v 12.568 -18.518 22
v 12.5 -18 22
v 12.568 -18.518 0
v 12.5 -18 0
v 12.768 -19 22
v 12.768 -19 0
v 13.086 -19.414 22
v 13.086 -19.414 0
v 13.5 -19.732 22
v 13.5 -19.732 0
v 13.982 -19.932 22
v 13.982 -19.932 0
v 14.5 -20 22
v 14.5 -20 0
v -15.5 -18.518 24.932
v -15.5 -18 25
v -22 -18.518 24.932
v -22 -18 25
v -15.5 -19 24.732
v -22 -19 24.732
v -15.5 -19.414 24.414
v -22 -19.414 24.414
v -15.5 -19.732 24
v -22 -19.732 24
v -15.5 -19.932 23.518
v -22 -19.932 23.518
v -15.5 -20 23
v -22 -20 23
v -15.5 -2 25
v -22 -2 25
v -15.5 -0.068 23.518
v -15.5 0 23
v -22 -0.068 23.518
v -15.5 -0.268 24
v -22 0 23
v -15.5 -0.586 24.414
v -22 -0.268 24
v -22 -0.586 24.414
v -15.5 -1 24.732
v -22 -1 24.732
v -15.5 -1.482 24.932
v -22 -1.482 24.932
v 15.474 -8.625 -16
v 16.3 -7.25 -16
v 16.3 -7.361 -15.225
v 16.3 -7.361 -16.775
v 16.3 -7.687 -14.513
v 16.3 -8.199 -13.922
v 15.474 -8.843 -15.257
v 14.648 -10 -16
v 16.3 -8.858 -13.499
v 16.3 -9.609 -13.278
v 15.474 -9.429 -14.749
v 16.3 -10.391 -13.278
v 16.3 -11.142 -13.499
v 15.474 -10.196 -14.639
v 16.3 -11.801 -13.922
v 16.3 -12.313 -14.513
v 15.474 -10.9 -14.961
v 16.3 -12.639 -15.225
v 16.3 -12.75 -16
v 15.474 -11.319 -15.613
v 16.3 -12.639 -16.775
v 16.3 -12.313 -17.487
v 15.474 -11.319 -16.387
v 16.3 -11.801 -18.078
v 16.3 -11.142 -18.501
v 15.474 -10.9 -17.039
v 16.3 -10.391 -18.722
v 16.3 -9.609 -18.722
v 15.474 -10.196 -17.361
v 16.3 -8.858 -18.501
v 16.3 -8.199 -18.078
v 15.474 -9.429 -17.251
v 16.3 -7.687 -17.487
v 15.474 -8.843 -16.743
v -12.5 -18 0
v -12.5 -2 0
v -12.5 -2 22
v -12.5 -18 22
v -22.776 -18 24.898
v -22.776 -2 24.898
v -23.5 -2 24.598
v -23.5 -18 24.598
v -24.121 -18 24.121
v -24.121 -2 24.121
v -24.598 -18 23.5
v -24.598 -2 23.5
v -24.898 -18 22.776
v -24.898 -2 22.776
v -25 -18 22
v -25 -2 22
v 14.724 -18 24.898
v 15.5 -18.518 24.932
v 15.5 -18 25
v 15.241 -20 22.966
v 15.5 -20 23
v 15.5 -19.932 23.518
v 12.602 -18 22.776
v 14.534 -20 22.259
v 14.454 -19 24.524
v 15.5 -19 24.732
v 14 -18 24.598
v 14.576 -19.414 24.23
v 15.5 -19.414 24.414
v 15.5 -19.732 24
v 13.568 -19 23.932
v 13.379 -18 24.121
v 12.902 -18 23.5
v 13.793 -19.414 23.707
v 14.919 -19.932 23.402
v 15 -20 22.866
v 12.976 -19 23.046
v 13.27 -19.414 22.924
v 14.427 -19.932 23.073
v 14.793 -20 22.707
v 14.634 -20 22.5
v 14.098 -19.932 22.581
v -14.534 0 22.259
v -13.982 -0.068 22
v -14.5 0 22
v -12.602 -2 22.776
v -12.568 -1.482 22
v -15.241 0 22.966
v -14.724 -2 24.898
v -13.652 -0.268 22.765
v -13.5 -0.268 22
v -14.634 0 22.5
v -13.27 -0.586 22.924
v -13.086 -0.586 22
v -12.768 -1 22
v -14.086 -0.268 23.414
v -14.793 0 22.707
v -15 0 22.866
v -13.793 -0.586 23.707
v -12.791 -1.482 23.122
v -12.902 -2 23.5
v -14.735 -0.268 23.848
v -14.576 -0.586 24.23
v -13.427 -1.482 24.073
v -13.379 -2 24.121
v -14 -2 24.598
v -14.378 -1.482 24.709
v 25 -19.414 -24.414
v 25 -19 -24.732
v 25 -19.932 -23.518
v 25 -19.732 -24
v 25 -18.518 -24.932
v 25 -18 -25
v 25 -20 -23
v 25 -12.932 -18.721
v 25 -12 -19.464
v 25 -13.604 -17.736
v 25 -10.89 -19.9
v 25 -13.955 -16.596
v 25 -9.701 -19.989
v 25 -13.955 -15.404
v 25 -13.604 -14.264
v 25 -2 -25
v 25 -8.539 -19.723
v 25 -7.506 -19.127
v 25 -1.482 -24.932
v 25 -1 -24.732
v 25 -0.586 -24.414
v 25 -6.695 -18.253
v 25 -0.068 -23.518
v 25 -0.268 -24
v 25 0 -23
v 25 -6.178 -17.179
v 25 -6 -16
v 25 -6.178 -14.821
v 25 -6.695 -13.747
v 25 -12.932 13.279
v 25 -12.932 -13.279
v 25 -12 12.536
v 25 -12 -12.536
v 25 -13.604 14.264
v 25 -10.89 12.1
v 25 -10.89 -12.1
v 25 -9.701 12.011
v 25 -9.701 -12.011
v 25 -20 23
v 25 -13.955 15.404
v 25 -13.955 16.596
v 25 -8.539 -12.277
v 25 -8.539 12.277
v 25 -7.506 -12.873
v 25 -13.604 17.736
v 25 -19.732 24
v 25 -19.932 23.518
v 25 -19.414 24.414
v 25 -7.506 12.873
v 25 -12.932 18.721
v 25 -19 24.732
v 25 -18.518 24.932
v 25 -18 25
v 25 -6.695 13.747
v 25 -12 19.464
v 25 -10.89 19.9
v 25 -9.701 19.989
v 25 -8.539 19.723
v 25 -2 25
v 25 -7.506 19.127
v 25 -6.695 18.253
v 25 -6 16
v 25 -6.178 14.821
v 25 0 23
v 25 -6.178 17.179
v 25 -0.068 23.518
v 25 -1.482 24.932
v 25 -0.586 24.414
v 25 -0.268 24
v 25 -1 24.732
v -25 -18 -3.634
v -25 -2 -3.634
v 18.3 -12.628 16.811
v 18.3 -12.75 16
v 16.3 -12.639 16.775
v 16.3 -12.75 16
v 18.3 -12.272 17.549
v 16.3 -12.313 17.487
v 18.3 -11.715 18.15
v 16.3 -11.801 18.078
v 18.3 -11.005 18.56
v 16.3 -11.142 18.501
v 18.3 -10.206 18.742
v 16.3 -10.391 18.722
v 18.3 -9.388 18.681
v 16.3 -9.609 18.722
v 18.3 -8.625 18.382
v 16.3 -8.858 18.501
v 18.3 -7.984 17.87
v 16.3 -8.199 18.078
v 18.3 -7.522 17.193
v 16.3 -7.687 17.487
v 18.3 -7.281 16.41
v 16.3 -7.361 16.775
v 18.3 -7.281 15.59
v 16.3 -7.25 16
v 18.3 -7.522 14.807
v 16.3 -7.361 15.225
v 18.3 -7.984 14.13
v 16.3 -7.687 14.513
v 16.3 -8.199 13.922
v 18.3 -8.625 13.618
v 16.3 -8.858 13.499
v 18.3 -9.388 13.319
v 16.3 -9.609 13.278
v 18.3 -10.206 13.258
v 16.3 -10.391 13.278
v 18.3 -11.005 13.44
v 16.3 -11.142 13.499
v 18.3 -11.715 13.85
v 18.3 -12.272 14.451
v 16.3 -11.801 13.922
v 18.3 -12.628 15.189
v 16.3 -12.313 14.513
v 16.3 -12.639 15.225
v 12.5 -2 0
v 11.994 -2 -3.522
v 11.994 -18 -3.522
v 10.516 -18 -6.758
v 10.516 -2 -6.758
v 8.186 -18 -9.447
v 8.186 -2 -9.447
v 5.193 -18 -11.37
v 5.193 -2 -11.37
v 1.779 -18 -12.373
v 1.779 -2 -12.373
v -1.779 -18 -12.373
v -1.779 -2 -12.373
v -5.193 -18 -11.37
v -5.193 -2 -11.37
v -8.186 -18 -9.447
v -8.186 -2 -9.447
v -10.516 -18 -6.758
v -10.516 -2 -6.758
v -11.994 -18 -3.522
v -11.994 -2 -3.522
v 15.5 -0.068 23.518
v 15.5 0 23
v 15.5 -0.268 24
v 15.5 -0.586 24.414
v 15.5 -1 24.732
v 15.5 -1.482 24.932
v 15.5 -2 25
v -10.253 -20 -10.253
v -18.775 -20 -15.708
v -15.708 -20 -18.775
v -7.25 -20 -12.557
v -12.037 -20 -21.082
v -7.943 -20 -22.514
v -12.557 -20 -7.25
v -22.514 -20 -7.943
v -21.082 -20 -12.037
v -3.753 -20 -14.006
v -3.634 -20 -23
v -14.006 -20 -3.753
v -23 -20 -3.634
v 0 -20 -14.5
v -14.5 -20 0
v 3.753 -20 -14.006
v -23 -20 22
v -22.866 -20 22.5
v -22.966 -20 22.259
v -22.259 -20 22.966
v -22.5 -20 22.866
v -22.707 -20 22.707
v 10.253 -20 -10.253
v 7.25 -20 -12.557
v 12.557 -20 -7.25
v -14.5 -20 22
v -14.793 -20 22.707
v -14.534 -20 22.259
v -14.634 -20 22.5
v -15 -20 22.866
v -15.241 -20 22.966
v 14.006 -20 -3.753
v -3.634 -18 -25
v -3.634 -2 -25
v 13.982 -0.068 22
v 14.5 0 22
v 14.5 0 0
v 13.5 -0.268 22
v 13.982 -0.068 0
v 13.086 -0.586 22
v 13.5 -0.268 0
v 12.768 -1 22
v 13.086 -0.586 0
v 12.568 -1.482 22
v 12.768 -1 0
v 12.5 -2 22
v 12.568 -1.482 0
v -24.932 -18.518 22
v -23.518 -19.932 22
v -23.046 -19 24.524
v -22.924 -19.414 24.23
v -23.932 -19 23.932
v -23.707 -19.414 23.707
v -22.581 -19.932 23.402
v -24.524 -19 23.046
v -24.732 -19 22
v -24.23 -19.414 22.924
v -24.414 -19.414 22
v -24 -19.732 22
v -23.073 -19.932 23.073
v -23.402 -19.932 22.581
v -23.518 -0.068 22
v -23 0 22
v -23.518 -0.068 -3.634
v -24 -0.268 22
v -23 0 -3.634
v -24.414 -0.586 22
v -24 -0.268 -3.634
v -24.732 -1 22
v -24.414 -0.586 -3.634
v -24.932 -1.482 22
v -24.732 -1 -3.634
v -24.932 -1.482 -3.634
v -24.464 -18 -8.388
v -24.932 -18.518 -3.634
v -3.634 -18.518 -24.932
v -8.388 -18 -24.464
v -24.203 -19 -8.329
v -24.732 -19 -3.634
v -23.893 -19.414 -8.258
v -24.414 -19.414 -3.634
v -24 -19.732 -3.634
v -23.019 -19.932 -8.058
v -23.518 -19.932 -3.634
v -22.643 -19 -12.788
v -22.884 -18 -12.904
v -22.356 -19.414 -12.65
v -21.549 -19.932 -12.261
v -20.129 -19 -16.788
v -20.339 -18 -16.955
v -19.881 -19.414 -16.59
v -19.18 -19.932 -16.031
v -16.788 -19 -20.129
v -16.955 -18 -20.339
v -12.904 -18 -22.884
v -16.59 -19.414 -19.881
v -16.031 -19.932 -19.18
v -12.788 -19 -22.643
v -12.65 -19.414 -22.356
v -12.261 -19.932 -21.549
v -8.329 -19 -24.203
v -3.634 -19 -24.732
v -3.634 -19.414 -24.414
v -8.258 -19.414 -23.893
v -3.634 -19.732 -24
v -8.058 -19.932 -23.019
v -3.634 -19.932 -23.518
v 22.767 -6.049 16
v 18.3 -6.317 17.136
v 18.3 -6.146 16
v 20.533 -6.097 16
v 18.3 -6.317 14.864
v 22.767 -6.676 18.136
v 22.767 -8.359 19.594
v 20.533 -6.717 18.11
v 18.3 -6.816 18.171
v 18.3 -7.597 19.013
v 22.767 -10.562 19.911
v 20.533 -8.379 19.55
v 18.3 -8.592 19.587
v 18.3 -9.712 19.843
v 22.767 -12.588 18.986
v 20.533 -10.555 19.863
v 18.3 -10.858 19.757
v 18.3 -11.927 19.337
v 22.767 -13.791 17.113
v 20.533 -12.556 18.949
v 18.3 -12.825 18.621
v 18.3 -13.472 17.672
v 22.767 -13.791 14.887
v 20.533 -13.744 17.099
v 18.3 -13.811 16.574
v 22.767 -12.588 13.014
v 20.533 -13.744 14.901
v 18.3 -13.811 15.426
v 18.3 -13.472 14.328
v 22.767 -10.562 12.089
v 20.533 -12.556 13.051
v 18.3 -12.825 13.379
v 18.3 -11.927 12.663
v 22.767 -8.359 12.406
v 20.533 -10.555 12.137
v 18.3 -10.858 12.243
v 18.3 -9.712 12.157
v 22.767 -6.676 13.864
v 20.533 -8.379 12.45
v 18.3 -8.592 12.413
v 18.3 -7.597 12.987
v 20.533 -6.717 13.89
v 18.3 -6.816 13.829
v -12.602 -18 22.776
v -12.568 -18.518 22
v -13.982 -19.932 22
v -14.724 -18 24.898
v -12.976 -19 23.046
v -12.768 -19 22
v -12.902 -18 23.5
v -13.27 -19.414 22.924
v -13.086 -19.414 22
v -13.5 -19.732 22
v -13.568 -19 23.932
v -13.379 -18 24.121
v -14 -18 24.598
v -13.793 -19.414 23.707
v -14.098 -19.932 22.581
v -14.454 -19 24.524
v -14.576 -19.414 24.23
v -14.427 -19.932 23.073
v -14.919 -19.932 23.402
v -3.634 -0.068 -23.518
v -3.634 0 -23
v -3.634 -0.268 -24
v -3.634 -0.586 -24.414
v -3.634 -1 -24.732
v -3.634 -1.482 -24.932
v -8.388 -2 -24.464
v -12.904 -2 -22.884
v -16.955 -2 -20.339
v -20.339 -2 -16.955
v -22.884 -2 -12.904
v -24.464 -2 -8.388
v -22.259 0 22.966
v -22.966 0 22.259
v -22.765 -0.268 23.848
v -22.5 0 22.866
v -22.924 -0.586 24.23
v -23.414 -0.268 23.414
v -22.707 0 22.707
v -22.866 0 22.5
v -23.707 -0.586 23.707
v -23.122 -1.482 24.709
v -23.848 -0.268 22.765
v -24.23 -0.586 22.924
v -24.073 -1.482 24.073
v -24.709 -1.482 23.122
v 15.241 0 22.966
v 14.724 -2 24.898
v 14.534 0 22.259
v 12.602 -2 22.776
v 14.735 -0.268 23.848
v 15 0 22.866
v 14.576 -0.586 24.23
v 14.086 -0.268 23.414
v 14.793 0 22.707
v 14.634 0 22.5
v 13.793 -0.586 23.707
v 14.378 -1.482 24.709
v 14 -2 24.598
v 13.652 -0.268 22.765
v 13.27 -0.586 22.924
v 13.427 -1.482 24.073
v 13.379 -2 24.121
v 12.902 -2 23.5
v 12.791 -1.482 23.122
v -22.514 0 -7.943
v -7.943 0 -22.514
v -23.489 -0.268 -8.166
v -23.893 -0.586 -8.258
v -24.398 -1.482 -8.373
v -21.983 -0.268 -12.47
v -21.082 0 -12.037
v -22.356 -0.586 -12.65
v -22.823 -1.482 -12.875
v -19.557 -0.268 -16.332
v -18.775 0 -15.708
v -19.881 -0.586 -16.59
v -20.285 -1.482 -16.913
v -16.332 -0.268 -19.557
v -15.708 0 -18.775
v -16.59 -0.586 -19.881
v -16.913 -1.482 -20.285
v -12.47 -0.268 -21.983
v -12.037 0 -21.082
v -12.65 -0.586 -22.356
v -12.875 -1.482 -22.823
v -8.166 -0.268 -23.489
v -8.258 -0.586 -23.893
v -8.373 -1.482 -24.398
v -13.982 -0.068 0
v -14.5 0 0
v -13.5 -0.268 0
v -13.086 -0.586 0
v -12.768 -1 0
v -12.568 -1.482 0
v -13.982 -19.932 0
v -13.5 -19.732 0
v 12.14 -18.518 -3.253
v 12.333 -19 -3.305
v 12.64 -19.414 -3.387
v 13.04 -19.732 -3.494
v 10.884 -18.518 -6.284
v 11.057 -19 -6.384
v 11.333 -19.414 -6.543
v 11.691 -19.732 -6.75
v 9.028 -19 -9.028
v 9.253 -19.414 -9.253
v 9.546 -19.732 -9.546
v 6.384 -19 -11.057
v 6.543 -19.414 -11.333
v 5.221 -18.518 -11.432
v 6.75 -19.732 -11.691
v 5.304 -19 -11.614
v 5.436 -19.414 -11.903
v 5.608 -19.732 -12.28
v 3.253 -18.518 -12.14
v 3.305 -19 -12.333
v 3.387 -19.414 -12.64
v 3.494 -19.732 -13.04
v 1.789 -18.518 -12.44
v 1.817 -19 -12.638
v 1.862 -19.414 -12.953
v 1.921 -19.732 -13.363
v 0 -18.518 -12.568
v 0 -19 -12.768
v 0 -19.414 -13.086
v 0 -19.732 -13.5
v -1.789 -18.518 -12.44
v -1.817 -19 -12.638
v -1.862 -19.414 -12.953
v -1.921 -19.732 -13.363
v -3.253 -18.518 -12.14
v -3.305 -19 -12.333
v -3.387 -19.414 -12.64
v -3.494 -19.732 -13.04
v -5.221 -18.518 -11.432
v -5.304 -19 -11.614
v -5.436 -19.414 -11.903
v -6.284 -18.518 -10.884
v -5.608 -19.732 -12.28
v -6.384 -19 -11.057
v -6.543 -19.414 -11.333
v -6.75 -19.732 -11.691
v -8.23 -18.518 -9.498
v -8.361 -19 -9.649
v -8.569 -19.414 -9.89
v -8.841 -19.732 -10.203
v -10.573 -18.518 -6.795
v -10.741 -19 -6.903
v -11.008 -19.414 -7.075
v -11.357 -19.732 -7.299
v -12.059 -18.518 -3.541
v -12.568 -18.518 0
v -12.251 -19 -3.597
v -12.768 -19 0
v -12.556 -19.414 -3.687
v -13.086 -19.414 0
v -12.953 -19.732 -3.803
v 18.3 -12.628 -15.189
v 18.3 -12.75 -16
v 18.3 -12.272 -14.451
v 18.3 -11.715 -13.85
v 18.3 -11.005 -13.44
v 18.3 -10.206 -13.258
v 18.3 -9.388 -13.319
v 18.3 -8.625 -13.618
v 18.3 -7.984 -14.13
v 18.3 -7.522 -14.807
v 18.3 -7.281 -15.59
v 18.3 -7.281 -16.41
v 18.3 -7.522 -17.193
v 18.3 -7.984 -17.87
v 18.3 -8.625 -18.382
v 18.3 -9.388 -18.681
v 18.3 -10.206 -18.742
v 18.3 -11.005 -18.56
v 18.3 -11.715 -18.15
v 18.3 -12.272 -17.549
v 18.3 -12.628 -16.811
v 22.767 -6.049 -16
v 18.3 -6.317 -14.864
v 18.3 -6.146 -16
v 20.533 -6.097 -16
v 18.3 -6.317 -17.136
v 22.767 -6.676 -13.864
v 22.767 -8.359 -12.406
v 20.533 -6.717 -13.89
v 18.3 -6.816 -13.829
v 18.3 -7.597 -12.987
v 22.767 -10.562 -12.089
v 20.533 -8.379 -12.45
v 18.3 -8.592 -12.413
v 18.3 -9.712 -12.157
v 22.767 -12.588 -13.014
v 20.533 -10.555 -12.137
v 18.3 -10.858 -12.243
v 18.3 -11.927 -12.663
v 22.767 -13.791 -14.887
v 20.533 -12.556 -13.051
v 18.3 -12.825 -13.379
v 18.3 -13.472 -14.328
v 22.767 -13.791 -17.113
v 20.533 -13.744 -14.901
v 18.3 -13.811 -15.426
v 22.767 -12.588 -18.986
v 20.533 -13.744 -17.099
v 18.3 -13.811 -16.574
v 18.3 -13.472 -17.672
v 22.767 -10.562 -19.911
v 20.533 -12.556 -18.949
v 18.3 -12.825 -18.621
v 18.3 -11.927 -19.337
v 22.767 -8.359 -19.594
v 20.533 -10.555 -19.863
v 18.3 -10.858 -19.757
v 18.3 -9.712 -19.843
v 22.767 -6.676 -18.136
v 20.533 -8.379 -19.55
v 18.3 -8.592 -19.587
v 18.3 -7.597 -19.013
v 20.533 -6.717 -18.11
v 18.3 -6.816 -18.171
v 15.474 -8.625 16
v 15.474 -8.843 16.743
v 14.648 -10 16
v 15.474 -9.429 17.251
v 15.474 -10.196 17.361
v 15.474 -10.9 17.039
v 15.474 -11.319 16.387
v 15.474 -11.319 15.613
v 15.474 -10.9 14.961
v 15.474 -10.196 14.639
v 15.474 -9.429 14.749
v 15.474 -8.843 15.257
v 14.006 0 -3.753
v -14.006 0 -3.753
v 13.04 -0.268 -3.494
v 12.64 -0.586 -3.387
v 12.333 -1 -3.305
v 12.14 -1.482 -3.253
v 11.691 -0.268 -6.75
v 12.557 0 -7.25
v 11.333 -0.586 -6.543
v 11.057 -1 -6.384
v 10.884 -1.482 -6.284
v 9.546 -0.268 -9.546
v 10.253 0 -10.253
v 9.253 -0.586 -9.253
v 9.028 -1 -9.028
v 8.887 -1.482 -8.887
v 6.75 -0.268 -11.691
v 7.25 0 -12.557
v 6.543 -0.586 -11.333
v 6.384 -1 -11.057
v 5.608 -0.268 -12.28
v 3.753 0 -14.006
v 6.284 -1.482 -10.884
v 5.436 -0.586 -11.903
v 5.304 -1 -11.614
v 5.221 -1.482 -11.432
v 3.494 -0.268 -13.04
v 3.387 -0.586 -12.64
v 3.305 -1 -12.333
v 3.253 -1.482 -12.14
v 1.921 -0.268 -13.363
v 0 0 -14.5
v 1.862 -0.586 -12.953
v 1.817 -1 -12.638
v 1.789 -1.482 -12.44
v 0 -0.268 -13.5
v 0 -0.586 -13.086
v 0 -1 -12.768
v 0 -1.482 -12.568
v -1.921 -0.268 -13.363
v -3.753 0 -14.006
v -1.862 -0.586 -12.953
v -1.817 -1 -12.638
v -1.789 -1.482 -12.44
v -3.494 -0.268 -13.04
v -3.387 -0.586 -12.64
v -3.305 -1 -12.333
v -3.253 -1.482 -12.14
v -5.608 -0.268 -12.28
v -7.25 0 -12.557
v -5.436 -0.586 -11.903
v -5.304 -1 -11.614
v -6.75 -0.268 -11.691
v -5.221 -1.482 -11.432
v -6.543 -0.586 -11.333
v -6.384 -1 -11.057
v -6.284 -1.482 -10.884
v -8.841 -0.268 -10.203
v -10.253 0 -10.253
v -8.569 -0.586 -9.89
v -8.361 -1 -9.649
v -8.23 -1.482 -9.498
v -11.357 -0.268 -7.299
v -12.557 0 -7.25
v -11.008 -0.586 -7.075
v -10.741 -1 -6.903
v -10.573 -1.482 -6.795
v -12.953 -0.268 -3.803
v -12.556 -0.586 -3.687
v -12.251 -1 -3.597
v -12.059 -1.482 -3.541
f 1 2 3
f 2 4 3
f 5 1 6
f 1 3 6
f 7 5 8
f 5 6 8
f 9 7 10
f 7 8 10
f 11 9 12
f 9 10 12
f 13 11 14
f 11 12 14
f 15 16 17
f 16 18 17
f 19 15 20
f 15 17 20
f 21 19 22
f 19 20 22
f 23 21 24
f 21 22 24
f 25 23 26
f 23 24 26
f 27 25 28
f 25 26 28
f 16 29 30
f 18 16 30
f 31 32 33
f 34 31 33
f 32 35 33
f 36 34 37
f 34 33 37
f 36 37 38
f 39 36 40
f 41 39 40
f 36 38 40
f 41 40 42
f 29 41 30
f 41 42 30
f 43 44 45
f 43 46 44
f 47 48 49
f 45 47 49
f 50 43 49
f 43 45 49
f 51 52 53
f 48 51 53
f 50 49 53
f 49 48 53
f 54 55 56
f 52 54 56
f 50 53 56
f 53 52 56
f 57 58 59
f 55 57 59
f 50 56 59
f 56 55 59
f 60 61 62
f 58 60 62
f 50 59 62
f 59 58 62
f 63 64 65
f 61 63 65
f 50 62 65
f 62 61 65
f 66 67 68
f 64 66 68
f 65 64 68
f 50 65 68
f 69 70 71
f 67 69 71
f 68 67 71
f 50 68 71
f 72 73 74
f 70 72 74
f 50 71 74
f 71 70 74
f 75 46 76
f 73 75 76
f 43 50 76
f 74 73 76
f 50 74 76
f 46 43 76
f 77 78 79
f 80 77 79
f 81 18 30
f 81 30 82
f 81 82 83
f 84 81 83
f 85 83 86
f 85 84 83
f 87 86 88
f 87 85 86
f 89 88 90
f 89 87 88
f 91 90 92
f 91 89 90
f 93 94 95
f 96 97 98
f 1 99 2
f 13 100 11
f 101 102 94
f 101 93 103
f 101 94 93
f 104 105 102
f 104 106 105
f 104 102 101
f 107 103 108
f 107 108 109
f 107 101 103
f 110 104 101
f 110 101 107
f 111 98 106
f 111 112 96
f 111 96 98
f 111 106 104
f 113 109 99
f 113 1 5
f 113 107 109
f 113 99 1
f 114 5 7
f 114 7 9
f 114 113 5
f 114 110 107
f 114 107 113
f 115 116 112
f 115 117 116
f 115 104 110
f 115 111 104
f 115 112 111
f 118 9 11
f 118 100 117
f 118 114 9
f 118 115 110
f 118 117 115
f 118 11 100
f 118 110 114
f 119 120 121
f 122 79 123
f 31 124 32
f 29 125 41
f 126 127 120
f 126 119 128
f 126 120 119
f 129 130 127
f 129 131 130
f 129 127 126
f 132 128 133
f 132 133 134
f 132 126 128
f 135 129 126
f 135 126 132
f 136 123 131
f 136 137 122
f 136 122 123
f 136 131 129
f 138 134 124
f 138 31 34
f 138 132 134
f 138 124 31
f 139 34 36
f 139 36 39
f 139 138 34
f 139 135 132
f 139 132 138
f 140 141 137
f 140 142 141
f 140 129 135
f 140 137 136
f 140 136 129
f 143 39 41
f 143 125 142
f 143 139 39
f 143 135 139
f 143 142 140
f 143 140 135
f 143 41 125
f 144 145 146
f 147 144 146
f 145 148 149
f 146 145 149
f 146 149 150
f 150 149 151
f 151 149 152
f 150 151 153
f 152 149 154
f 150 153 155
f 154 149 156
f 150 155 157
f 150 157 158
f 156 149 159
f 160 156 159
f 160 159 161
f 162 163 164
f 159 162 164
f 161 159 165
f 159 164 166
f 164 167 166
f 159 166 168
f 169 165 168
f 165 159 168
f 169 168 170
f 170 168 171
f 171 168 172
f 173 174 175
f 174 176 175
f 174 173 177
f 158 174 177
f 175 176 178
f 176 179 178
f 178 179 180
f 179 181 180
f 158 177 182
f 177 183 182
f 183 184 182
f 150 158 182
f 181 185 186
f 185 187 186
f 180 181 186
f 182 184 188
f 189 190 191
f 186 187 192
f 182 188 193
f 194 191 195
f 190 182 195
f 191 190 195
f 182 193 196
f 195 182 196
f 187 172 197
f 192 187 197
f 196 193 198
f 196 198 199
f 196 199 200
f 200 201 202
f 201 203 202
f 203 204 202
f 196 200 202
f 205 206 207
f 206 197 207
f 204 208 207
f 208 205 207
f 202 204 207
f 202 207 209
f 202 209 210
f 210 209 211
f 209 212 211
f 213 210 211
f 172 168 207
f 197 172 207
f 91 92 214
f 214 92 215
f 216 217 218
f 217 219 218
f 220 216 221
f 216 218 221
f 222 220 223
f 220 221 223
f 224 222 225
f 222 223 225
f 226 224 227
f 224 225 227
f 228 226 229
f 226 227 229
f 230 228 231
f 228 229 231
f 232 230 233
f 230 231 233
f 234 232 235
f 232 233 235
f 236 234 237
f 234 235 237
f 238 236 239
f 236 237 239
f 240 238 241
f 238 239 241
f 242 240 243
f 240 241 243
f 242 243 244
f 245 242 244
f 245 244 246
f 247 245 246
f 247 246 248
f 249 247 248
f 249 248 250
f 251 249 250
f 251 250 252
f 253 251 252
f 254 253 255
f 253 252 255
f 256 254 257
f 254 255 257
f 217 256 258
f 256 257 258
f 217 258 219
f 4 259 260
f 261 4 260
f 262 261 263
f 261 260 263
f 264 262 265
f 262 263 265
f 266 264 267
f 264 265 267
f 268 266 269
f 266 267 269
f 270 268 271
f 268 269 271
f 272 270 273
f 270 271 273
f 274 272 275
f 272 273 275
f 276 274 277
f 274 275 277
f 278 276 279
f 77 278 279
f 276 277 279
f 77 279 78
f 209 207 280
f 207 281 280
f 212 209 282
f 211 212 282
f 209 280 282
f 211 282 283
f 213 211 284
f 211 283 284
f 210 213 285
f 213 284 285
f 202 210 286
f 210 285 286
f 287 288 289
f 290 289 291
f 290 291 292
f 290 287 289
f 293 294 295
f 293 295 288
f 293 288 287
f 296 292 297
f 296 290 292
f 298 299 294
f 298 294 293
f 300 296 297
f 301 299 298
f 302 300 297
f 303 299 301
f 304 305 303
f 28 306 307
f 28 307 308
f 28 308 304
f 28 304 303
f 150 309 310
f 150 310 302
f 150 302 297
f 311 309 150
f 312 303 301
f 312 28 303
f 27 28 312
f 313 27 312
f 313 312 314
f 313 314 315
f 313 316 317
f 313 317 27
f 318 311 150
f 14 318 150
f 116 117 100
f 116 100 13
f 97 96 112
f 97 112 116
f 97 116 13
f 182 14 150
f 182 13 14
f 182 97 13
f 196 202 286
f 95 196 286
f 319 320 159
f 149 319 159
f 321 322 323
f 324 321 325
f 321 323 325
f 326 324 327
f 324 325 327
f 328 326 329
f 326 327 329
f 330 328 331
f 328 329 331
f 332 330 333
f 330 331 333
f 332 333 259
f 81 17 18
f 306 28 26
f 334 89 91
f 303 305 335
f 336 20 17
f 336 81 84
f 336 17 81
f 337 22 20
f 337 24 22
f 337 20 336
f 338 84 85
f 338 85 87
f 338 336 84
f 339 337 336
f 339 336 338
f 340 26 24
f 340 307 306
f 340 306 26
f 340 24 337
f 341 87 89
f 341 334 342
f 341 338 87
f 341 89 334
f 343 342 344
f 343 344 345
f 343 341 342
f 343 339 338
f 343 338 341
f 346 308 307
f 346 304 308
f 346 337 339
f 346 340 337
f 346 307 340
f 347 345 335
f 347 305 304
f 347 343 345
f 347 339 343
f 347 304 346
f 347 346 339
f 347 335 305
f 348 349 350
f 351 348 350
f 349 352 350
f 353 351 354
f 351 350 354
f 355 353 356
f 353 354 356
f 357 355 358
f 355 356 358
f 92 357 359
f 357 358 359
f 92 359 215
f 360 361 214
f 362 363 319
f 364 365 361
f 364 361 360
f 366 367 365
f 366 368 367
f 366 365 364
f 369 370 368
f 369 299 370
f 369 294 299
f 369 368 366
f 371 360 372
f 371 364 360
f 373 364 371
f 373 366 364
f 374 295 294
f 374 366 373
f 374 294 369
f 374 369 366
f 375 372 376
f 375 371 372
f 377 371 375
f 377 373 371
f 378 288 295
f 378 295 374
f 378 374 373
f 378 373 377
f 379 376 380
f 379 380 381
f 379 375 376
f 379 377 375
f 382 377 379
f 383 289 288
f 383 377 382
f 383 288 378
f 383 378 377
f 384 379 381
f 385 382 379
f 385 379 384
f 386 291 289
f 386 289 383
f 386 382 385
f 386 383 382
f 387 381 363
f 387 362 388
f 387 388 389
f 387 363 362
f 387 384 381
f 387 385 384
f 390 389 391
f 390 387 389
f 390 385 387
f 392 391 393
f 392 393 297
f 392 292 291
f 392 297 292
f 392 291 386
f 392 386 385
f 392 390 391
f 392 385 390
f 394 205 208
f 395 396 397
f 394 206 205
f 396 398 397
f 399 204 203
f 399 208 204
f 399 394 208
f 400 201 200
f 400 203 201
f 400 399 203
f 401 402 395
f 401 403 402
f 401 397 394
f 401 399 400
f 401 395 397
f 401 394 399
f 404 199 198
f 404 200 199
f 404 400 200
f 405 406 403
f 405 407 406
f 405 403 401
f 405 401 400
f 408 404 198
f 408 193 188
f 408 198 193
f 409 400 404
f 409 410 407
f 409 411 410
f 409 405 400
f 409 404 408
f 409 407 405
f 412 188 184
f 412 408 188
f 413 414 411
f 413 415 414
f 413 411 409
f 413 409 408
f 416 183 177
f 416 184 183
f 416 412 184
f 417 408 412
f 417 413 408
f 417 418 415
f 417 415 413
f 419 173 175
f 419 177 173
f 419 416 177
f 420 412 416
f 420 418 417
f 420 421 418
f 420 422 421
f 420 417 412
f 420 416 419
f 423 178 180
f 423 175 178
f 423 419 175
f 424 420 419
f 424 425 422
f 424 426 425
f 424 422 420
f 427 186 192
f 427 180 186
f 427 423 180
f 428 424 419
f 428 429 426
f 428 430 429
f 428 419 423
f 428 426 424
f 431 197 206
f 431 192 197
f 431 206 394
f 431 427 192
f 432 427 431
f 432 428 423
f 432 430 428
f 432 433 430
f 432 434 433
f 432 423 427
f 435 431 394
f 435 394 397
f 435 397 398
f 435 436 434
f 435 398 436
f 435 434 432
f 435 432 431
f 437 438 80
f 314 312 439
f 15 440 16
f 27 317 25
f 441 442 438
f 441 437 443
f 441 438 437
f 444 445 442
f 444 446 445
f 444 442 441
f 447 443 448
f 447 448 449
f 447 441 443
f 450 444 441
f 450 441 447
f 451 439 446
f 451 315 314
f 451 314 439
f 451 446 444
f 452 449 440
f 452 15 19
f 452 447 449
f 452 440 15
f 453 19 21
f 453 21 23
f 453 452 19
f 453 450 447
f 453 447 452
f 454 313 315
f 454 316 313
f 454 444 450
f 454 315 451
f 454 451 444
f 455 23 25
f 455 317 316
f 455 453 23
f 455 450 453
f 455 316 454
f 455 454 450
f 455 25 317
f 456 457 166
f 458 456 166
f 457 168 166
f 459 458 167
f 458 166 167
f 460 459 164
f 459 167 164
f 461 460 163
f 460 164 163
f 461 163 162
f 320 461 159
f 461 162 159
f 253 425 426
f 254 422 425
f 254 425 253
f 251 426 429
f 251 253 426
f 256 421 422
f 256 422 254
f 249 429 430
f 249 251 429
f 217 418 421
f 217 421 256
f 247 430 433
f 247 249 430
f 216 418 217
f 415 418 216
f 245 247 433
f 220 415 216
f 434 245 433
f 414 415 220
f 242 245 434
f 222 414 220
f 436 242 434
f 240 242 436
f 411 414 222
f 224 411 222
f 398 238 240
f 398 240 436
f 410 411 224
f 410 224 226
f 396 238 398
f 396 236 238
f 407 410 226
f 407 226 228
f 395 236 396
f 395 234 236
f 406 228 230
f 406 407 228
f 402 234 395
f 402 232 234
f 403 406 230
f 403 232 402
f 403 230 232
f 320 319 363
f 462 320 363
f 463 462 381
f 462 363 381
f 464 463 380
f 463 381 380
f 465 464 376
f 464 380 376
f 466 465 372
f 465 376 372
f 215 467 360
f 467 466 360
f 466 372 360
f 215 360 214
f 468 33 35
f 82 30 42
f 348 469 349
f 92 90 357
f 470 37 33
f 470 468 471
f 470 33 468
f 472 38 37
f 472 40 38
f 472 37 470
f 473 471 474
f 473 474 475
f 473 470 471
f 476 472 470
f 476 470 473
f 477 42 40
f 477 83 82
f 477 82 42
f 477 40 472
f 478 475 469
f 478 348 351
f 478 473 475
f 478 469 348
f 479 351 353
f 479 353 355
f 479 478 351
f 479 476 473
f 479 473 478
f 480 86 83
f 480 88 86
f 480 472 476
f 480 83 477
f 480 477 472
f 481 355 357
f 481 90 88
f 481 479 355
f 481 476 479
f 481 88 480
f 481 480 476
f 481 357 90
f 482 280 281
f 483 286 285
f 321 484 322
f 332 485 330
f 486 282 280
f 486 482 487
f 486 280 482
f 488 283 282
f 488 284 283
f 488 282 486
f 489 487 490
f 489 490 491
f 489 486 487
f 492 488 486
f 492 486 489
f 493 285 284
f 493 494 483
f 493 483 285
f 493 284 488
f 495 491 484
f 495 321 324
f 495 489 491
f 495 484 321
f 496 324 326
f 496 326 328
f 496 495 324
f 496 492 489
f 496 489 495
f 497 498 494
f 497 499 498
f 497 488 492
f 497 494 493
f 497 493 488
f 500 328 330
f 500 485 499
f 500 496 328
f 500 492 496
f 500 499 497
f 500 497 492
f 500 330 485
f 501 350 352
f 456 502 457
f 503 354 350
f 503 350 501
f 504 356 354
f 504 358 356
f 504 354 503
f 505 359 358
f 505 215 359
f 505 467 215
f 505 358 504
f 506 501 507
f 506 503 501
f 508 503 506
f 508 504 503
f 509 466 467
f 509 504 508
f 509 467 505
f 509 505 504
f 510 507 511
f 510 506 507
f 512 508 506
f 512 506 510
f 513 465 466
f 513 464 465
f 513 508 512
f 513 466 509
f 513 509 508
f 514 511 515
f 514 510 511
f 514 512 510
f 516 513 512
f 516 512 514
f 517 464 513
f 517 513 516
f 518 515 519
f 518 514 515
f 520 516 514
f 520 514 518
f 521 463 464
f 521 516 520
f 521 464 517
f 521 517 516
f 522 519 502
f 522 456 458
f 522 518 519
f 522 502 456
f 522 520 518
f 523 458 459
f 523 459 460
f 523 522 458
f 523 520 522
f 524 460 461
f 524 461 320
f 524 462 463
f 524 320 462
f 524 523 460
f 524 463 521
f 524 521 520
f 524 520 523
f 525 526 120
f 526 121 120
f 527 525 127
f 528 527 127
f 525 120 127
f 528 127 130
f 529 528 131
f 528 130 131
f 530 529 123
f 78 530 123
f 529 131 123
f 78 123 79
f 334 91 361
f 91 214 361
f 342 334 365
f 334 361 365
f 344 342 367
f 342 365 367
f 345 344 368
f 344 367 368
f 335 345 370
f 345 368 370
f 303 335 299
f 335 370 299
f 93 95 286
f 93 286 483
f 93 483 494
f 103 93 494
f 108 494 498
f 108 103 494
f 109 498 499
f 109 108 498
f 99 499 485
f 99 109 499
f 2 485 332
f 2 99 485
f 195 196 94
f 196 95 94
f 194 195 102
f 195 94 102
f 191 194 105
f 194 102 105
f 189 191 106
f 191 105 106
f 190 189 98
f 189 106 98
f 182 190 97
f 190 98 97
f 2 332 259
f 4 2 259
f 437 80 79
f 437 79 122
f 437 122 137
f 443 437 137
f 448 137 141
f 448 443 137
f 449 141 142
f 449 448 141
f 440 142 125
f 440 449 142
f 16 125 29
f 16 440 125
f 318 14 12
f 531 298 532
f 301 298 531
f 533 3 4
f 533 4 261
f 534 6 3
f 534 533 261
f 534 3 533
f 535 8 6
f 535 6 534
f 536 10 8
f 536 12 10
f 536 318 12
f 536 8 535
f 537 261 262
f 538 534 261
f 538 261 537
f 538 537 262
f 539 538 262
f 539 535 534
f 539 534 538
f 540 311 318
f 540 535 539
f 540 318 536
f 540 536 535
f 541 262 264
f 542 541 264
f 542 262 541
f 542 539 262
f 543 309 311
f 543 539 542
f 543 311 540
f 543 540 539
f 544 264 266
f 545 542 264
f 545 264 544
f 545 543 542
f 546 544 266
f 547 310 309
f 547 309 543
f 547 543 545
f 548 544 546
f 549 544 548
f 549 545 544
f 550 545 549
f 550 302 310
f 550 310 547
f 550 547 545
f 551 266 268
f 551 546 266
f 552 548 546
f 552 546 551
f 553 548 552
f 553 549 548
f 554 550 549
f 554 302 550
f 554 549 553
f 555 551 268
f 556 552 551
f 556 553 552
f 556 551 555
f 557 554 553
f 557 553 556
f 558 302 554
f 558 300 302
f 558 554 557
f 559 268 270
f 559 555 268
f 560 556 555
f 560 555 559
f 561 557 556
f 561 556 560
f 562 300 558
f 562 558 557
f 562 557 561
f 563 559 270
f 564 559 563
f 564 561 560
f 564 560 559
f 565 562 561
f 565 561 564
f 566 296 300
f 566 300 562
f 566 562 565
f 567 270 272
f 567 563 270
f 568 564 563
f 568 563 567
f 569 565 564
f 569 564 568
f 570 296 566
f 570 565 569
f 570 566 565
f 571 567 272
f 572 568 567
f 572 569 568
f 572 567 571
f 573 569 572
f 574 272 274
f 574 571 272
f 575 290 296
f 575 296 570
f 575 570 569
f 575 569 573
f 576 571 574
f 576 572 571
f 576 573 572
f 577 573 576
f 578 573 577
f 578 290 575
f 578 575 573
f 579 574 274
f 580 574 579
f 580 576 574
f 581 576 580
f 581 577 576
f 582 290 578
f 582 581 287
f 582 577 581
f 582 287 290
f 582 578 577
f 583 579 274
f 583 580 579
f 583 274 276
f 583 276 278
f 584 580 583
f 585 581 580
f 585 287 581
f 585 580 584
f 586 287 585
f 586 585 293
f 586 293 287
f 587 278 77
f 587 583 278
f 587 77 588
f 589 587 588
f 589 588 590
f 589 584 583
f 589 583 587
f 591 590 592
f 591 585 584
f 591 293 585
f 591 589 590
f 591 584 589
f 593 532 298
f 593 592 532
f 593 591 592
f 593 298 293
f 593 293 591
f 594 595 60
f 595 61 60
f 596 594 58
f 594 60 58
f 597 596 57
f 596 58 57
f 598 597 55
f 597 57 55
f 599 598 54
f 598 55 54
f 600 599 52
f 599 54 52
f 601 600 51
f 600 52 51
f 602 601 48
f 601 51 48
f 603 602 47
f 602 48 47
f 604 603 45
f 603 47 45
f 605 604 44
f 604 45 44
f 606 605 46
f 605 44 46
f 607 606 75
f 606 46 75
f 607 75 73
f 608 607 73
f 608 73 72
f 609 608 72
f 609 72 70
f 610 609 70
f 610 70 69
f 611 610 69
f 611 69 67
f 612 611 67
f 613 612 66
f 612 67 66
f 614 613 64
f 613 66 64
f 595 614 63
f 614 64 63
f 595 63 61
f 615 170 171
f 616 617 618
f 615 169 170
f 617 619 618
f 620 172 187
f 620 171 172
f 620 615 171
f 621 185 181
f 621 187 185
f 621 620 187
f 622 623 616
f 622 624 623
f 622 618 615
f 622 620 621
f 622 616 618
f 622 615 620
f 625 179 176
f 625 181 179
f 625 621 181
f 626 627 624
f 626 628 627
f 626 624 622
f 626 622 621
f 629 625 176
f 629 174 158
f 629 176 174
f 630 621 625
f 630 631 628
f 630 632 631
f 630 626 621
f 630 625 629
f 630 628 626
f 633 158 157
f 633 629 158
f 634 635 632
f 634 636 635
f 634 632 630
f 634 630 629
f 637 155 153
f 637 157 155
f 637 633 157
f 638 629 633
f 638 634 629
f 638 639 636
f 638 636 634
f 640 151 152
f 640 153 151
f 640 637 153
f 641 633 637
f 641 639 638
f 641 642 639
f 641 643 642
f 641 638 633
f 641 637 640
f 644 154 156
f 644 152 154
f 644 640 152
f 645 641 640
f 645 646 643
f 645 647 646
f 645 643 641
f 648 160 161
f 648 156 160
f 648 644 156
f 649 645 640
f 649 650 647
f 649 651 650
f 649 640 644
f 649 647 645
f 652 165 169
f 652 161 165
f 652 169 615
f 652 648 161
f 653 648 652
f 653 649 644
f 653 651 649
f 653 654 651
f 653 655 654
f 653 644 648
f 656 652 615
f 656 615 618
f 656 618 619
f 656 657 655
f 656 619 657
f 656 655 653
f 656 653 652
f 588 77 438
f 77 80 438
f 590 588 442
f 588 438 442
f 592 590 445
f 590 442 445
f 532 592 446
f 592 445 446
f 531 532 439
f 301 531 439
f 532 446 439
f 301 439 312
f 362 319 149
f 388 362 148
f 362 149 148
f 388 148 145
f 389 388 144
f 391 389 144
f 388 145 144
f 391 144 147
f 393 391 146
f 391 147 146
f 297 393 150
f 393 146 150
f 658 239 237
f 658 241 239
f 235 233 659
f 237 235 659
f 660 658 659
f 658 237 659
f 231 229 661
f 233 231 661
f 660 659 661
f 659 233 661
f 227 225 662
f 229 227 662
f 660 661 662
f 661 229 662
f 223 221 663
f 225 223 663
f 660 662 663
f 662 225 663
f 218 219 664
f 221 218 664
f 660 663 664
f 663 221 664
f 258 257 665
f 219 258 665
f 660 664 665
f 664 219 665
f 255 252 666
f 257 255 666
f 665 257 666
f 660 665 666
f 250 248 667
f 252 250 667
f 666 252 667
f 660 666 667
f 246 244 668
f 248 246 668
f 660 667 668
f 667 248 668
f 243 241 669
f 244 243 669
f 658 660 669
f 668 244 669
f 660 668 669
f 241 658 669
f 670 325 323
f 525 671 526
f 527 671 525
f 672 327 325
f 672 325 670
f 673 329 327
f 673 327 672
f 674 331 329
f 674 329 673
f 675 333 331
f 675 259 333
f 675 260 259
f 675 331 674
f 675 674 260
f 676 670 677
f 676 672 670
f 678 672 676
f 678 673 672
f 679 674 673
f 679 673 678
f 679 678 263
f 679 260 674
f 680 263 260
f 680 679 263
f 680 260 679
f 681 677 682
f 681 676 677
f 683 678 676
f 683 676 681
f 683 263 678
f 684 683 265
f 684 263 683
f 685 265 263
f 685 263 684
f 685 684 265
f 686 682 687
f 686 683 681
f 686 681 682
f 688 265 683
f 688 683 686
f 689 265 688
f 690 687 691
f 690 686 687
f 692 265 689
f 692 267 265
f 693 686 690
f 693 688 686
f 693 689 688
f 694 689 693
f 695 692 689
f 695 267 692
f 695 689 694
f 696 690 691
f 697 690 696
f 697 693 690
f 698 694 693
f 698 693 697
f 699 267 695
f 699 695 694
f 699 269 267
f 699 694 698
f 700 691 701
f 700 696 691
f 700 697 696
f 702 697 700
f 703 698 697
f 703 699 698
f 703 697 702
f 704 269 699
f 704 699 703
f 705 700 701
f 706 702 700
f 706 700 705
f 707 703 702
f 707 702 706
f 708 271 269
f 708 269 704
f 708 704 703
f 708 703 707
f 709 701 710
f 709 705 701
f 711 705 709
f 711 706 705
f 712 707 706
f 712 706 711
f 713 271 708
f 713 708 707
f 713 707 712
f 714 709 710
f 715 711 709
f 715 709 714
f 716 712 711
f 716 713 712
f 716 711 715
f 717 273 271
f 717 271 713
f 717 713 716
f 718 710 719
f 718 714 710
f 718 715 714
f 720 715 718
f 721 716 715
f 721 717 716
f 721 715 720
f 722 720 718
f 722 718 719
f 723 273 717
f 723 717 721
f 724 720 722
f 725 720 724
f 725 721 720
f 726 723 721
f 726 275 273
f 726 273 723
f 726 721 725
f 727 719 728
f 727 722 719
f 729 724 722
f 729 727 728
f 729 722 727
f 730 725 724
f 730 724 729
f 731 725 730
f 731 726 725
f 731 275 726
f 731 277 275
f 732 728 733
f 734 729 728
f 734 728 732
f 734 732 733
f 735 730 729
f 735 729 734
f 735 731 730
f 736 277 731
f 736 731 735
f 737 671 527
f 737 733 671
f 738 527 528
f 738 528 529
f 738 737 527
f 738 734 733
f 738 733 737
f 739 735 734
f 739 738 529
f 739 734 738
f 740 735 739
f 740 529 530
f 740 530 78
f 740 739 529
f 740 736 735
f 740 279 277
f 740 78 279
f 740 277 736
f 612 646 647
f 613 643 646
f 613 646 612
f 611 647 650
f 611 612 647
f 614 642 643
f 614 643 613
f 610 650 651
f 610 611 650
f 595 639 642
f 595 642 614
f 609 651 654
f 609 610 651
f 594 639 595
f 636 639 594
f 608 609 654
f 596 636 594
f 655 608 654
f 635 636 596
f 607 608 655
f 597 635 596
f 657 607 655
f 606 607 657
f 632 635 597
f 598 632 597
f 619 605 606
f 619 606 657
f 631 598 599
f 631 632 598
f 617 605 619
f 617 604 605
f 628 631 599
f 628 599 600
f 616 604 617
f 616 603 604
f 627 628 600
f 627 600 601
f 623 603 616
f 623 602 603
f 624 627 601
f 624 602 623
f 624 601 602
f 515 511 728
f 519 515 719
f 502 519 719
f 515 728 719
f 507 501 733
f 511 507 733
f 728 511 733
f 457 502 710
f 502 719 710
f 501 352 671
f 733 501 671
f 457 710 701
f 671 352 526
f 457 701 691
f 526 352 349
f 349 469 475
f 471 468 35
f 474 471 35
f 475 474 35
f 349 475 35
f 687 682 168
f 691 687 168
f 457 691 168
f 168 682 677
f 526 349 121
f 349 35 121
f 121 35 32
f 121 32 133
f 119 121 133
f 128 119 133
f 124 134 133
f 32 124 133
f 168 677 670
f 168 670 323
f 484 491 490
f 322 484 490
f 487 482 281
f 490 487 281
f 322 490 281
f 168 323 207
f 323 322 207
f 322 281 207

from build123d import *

# Parameters (mm, degrees)
F1_DEPTH = 20
F2_R     = 3
F3_R     = 21.3660555905
F4_R     = 4
F7_DEPTH = 6.7
F7_TAPER = 1.25
F8_D     = 5.5
F8_DEPTH = 2
F8_START = 6.7
F8_TIP   = 1.6523667023
F9_R     = 2


with BuildPart() as f1:
    # F0 (on Front) → F1 (new body)
    with BuildSketch(Plane.XZ):
        with BuildLine():
            Line((-25, -25), (25, -25))
            Line((25, -25), (25, 25))
            Line((25, 25), (12.5, 25))
            Line((12.5, 25), (12.5, 0))
            ThreePointArc((12.5, 0), (0, -12.5), (-12.5, 0))
            Line((-12.5, 0), (-12.5, 25))
            Line((-12.5, 25), (-25, 25))
            Line((-25, 25), (-25, -25))
        make_face()
    extrude(amount=F1_DEPTH)

    # F2
    f2_edges = [f1.edges().sort_by_distance(p)[0] for p in [
        (12.5, -10, 25),
        (-12.5, -10, 25),
        (-25, -10, 25),
    ]]
    fillet(f2_edges, radius=F2_R)

    # F3
    f3_edges = [f1.edges().sort_by_distance(p)[0] for p in [
        (-25, -10, -25),
    ]]
    fillet(f3_edges, radius=F3_R)

    # F4 (on face) → F7 (cut)
    with BuildSketch(Plane.YZ.offset(25)):
        with Locations((-10, 16)):
            Circle(F4_R)
        with Locations((-10, -16)):
            Circle(F4_R)
    extrude(amount=-F7_DEPTH, taper=F7_TAPER, mode=Mode.SUBTRACT)

    # F8
    # its depths count from where the whole tool has entered the part; down to there all is cleared
    with Locations(Plane.YZ.offset(25)):
        with Locations((-10, 16), (-10, -16)):
            Hole(F8_D / 2, depth=F8_START)
    with Locations(Plane.YZ.offset(25).offset(-F8_START)):
        with Locations((-10, 16), (-10, -16)):
            Hole(F8_D / 2, depth=F8_DEPTH)
            with Locations((0, 0, -(F8_DEPTH + F8_TIP / 2))):  # 118° drill point
                Cone(0, F8_D / 2, F8_TIP, mode=Mode.SUBTRACT)

    # F9
    f9_edges = [f1.edges().sort_by_distance(p)[0] for p in [
        (20.25, 0, 25),
        (20.25, -20, 25),
    ]]
    fillet(f9_edges, radius=F9_R)


solid = f1.part
